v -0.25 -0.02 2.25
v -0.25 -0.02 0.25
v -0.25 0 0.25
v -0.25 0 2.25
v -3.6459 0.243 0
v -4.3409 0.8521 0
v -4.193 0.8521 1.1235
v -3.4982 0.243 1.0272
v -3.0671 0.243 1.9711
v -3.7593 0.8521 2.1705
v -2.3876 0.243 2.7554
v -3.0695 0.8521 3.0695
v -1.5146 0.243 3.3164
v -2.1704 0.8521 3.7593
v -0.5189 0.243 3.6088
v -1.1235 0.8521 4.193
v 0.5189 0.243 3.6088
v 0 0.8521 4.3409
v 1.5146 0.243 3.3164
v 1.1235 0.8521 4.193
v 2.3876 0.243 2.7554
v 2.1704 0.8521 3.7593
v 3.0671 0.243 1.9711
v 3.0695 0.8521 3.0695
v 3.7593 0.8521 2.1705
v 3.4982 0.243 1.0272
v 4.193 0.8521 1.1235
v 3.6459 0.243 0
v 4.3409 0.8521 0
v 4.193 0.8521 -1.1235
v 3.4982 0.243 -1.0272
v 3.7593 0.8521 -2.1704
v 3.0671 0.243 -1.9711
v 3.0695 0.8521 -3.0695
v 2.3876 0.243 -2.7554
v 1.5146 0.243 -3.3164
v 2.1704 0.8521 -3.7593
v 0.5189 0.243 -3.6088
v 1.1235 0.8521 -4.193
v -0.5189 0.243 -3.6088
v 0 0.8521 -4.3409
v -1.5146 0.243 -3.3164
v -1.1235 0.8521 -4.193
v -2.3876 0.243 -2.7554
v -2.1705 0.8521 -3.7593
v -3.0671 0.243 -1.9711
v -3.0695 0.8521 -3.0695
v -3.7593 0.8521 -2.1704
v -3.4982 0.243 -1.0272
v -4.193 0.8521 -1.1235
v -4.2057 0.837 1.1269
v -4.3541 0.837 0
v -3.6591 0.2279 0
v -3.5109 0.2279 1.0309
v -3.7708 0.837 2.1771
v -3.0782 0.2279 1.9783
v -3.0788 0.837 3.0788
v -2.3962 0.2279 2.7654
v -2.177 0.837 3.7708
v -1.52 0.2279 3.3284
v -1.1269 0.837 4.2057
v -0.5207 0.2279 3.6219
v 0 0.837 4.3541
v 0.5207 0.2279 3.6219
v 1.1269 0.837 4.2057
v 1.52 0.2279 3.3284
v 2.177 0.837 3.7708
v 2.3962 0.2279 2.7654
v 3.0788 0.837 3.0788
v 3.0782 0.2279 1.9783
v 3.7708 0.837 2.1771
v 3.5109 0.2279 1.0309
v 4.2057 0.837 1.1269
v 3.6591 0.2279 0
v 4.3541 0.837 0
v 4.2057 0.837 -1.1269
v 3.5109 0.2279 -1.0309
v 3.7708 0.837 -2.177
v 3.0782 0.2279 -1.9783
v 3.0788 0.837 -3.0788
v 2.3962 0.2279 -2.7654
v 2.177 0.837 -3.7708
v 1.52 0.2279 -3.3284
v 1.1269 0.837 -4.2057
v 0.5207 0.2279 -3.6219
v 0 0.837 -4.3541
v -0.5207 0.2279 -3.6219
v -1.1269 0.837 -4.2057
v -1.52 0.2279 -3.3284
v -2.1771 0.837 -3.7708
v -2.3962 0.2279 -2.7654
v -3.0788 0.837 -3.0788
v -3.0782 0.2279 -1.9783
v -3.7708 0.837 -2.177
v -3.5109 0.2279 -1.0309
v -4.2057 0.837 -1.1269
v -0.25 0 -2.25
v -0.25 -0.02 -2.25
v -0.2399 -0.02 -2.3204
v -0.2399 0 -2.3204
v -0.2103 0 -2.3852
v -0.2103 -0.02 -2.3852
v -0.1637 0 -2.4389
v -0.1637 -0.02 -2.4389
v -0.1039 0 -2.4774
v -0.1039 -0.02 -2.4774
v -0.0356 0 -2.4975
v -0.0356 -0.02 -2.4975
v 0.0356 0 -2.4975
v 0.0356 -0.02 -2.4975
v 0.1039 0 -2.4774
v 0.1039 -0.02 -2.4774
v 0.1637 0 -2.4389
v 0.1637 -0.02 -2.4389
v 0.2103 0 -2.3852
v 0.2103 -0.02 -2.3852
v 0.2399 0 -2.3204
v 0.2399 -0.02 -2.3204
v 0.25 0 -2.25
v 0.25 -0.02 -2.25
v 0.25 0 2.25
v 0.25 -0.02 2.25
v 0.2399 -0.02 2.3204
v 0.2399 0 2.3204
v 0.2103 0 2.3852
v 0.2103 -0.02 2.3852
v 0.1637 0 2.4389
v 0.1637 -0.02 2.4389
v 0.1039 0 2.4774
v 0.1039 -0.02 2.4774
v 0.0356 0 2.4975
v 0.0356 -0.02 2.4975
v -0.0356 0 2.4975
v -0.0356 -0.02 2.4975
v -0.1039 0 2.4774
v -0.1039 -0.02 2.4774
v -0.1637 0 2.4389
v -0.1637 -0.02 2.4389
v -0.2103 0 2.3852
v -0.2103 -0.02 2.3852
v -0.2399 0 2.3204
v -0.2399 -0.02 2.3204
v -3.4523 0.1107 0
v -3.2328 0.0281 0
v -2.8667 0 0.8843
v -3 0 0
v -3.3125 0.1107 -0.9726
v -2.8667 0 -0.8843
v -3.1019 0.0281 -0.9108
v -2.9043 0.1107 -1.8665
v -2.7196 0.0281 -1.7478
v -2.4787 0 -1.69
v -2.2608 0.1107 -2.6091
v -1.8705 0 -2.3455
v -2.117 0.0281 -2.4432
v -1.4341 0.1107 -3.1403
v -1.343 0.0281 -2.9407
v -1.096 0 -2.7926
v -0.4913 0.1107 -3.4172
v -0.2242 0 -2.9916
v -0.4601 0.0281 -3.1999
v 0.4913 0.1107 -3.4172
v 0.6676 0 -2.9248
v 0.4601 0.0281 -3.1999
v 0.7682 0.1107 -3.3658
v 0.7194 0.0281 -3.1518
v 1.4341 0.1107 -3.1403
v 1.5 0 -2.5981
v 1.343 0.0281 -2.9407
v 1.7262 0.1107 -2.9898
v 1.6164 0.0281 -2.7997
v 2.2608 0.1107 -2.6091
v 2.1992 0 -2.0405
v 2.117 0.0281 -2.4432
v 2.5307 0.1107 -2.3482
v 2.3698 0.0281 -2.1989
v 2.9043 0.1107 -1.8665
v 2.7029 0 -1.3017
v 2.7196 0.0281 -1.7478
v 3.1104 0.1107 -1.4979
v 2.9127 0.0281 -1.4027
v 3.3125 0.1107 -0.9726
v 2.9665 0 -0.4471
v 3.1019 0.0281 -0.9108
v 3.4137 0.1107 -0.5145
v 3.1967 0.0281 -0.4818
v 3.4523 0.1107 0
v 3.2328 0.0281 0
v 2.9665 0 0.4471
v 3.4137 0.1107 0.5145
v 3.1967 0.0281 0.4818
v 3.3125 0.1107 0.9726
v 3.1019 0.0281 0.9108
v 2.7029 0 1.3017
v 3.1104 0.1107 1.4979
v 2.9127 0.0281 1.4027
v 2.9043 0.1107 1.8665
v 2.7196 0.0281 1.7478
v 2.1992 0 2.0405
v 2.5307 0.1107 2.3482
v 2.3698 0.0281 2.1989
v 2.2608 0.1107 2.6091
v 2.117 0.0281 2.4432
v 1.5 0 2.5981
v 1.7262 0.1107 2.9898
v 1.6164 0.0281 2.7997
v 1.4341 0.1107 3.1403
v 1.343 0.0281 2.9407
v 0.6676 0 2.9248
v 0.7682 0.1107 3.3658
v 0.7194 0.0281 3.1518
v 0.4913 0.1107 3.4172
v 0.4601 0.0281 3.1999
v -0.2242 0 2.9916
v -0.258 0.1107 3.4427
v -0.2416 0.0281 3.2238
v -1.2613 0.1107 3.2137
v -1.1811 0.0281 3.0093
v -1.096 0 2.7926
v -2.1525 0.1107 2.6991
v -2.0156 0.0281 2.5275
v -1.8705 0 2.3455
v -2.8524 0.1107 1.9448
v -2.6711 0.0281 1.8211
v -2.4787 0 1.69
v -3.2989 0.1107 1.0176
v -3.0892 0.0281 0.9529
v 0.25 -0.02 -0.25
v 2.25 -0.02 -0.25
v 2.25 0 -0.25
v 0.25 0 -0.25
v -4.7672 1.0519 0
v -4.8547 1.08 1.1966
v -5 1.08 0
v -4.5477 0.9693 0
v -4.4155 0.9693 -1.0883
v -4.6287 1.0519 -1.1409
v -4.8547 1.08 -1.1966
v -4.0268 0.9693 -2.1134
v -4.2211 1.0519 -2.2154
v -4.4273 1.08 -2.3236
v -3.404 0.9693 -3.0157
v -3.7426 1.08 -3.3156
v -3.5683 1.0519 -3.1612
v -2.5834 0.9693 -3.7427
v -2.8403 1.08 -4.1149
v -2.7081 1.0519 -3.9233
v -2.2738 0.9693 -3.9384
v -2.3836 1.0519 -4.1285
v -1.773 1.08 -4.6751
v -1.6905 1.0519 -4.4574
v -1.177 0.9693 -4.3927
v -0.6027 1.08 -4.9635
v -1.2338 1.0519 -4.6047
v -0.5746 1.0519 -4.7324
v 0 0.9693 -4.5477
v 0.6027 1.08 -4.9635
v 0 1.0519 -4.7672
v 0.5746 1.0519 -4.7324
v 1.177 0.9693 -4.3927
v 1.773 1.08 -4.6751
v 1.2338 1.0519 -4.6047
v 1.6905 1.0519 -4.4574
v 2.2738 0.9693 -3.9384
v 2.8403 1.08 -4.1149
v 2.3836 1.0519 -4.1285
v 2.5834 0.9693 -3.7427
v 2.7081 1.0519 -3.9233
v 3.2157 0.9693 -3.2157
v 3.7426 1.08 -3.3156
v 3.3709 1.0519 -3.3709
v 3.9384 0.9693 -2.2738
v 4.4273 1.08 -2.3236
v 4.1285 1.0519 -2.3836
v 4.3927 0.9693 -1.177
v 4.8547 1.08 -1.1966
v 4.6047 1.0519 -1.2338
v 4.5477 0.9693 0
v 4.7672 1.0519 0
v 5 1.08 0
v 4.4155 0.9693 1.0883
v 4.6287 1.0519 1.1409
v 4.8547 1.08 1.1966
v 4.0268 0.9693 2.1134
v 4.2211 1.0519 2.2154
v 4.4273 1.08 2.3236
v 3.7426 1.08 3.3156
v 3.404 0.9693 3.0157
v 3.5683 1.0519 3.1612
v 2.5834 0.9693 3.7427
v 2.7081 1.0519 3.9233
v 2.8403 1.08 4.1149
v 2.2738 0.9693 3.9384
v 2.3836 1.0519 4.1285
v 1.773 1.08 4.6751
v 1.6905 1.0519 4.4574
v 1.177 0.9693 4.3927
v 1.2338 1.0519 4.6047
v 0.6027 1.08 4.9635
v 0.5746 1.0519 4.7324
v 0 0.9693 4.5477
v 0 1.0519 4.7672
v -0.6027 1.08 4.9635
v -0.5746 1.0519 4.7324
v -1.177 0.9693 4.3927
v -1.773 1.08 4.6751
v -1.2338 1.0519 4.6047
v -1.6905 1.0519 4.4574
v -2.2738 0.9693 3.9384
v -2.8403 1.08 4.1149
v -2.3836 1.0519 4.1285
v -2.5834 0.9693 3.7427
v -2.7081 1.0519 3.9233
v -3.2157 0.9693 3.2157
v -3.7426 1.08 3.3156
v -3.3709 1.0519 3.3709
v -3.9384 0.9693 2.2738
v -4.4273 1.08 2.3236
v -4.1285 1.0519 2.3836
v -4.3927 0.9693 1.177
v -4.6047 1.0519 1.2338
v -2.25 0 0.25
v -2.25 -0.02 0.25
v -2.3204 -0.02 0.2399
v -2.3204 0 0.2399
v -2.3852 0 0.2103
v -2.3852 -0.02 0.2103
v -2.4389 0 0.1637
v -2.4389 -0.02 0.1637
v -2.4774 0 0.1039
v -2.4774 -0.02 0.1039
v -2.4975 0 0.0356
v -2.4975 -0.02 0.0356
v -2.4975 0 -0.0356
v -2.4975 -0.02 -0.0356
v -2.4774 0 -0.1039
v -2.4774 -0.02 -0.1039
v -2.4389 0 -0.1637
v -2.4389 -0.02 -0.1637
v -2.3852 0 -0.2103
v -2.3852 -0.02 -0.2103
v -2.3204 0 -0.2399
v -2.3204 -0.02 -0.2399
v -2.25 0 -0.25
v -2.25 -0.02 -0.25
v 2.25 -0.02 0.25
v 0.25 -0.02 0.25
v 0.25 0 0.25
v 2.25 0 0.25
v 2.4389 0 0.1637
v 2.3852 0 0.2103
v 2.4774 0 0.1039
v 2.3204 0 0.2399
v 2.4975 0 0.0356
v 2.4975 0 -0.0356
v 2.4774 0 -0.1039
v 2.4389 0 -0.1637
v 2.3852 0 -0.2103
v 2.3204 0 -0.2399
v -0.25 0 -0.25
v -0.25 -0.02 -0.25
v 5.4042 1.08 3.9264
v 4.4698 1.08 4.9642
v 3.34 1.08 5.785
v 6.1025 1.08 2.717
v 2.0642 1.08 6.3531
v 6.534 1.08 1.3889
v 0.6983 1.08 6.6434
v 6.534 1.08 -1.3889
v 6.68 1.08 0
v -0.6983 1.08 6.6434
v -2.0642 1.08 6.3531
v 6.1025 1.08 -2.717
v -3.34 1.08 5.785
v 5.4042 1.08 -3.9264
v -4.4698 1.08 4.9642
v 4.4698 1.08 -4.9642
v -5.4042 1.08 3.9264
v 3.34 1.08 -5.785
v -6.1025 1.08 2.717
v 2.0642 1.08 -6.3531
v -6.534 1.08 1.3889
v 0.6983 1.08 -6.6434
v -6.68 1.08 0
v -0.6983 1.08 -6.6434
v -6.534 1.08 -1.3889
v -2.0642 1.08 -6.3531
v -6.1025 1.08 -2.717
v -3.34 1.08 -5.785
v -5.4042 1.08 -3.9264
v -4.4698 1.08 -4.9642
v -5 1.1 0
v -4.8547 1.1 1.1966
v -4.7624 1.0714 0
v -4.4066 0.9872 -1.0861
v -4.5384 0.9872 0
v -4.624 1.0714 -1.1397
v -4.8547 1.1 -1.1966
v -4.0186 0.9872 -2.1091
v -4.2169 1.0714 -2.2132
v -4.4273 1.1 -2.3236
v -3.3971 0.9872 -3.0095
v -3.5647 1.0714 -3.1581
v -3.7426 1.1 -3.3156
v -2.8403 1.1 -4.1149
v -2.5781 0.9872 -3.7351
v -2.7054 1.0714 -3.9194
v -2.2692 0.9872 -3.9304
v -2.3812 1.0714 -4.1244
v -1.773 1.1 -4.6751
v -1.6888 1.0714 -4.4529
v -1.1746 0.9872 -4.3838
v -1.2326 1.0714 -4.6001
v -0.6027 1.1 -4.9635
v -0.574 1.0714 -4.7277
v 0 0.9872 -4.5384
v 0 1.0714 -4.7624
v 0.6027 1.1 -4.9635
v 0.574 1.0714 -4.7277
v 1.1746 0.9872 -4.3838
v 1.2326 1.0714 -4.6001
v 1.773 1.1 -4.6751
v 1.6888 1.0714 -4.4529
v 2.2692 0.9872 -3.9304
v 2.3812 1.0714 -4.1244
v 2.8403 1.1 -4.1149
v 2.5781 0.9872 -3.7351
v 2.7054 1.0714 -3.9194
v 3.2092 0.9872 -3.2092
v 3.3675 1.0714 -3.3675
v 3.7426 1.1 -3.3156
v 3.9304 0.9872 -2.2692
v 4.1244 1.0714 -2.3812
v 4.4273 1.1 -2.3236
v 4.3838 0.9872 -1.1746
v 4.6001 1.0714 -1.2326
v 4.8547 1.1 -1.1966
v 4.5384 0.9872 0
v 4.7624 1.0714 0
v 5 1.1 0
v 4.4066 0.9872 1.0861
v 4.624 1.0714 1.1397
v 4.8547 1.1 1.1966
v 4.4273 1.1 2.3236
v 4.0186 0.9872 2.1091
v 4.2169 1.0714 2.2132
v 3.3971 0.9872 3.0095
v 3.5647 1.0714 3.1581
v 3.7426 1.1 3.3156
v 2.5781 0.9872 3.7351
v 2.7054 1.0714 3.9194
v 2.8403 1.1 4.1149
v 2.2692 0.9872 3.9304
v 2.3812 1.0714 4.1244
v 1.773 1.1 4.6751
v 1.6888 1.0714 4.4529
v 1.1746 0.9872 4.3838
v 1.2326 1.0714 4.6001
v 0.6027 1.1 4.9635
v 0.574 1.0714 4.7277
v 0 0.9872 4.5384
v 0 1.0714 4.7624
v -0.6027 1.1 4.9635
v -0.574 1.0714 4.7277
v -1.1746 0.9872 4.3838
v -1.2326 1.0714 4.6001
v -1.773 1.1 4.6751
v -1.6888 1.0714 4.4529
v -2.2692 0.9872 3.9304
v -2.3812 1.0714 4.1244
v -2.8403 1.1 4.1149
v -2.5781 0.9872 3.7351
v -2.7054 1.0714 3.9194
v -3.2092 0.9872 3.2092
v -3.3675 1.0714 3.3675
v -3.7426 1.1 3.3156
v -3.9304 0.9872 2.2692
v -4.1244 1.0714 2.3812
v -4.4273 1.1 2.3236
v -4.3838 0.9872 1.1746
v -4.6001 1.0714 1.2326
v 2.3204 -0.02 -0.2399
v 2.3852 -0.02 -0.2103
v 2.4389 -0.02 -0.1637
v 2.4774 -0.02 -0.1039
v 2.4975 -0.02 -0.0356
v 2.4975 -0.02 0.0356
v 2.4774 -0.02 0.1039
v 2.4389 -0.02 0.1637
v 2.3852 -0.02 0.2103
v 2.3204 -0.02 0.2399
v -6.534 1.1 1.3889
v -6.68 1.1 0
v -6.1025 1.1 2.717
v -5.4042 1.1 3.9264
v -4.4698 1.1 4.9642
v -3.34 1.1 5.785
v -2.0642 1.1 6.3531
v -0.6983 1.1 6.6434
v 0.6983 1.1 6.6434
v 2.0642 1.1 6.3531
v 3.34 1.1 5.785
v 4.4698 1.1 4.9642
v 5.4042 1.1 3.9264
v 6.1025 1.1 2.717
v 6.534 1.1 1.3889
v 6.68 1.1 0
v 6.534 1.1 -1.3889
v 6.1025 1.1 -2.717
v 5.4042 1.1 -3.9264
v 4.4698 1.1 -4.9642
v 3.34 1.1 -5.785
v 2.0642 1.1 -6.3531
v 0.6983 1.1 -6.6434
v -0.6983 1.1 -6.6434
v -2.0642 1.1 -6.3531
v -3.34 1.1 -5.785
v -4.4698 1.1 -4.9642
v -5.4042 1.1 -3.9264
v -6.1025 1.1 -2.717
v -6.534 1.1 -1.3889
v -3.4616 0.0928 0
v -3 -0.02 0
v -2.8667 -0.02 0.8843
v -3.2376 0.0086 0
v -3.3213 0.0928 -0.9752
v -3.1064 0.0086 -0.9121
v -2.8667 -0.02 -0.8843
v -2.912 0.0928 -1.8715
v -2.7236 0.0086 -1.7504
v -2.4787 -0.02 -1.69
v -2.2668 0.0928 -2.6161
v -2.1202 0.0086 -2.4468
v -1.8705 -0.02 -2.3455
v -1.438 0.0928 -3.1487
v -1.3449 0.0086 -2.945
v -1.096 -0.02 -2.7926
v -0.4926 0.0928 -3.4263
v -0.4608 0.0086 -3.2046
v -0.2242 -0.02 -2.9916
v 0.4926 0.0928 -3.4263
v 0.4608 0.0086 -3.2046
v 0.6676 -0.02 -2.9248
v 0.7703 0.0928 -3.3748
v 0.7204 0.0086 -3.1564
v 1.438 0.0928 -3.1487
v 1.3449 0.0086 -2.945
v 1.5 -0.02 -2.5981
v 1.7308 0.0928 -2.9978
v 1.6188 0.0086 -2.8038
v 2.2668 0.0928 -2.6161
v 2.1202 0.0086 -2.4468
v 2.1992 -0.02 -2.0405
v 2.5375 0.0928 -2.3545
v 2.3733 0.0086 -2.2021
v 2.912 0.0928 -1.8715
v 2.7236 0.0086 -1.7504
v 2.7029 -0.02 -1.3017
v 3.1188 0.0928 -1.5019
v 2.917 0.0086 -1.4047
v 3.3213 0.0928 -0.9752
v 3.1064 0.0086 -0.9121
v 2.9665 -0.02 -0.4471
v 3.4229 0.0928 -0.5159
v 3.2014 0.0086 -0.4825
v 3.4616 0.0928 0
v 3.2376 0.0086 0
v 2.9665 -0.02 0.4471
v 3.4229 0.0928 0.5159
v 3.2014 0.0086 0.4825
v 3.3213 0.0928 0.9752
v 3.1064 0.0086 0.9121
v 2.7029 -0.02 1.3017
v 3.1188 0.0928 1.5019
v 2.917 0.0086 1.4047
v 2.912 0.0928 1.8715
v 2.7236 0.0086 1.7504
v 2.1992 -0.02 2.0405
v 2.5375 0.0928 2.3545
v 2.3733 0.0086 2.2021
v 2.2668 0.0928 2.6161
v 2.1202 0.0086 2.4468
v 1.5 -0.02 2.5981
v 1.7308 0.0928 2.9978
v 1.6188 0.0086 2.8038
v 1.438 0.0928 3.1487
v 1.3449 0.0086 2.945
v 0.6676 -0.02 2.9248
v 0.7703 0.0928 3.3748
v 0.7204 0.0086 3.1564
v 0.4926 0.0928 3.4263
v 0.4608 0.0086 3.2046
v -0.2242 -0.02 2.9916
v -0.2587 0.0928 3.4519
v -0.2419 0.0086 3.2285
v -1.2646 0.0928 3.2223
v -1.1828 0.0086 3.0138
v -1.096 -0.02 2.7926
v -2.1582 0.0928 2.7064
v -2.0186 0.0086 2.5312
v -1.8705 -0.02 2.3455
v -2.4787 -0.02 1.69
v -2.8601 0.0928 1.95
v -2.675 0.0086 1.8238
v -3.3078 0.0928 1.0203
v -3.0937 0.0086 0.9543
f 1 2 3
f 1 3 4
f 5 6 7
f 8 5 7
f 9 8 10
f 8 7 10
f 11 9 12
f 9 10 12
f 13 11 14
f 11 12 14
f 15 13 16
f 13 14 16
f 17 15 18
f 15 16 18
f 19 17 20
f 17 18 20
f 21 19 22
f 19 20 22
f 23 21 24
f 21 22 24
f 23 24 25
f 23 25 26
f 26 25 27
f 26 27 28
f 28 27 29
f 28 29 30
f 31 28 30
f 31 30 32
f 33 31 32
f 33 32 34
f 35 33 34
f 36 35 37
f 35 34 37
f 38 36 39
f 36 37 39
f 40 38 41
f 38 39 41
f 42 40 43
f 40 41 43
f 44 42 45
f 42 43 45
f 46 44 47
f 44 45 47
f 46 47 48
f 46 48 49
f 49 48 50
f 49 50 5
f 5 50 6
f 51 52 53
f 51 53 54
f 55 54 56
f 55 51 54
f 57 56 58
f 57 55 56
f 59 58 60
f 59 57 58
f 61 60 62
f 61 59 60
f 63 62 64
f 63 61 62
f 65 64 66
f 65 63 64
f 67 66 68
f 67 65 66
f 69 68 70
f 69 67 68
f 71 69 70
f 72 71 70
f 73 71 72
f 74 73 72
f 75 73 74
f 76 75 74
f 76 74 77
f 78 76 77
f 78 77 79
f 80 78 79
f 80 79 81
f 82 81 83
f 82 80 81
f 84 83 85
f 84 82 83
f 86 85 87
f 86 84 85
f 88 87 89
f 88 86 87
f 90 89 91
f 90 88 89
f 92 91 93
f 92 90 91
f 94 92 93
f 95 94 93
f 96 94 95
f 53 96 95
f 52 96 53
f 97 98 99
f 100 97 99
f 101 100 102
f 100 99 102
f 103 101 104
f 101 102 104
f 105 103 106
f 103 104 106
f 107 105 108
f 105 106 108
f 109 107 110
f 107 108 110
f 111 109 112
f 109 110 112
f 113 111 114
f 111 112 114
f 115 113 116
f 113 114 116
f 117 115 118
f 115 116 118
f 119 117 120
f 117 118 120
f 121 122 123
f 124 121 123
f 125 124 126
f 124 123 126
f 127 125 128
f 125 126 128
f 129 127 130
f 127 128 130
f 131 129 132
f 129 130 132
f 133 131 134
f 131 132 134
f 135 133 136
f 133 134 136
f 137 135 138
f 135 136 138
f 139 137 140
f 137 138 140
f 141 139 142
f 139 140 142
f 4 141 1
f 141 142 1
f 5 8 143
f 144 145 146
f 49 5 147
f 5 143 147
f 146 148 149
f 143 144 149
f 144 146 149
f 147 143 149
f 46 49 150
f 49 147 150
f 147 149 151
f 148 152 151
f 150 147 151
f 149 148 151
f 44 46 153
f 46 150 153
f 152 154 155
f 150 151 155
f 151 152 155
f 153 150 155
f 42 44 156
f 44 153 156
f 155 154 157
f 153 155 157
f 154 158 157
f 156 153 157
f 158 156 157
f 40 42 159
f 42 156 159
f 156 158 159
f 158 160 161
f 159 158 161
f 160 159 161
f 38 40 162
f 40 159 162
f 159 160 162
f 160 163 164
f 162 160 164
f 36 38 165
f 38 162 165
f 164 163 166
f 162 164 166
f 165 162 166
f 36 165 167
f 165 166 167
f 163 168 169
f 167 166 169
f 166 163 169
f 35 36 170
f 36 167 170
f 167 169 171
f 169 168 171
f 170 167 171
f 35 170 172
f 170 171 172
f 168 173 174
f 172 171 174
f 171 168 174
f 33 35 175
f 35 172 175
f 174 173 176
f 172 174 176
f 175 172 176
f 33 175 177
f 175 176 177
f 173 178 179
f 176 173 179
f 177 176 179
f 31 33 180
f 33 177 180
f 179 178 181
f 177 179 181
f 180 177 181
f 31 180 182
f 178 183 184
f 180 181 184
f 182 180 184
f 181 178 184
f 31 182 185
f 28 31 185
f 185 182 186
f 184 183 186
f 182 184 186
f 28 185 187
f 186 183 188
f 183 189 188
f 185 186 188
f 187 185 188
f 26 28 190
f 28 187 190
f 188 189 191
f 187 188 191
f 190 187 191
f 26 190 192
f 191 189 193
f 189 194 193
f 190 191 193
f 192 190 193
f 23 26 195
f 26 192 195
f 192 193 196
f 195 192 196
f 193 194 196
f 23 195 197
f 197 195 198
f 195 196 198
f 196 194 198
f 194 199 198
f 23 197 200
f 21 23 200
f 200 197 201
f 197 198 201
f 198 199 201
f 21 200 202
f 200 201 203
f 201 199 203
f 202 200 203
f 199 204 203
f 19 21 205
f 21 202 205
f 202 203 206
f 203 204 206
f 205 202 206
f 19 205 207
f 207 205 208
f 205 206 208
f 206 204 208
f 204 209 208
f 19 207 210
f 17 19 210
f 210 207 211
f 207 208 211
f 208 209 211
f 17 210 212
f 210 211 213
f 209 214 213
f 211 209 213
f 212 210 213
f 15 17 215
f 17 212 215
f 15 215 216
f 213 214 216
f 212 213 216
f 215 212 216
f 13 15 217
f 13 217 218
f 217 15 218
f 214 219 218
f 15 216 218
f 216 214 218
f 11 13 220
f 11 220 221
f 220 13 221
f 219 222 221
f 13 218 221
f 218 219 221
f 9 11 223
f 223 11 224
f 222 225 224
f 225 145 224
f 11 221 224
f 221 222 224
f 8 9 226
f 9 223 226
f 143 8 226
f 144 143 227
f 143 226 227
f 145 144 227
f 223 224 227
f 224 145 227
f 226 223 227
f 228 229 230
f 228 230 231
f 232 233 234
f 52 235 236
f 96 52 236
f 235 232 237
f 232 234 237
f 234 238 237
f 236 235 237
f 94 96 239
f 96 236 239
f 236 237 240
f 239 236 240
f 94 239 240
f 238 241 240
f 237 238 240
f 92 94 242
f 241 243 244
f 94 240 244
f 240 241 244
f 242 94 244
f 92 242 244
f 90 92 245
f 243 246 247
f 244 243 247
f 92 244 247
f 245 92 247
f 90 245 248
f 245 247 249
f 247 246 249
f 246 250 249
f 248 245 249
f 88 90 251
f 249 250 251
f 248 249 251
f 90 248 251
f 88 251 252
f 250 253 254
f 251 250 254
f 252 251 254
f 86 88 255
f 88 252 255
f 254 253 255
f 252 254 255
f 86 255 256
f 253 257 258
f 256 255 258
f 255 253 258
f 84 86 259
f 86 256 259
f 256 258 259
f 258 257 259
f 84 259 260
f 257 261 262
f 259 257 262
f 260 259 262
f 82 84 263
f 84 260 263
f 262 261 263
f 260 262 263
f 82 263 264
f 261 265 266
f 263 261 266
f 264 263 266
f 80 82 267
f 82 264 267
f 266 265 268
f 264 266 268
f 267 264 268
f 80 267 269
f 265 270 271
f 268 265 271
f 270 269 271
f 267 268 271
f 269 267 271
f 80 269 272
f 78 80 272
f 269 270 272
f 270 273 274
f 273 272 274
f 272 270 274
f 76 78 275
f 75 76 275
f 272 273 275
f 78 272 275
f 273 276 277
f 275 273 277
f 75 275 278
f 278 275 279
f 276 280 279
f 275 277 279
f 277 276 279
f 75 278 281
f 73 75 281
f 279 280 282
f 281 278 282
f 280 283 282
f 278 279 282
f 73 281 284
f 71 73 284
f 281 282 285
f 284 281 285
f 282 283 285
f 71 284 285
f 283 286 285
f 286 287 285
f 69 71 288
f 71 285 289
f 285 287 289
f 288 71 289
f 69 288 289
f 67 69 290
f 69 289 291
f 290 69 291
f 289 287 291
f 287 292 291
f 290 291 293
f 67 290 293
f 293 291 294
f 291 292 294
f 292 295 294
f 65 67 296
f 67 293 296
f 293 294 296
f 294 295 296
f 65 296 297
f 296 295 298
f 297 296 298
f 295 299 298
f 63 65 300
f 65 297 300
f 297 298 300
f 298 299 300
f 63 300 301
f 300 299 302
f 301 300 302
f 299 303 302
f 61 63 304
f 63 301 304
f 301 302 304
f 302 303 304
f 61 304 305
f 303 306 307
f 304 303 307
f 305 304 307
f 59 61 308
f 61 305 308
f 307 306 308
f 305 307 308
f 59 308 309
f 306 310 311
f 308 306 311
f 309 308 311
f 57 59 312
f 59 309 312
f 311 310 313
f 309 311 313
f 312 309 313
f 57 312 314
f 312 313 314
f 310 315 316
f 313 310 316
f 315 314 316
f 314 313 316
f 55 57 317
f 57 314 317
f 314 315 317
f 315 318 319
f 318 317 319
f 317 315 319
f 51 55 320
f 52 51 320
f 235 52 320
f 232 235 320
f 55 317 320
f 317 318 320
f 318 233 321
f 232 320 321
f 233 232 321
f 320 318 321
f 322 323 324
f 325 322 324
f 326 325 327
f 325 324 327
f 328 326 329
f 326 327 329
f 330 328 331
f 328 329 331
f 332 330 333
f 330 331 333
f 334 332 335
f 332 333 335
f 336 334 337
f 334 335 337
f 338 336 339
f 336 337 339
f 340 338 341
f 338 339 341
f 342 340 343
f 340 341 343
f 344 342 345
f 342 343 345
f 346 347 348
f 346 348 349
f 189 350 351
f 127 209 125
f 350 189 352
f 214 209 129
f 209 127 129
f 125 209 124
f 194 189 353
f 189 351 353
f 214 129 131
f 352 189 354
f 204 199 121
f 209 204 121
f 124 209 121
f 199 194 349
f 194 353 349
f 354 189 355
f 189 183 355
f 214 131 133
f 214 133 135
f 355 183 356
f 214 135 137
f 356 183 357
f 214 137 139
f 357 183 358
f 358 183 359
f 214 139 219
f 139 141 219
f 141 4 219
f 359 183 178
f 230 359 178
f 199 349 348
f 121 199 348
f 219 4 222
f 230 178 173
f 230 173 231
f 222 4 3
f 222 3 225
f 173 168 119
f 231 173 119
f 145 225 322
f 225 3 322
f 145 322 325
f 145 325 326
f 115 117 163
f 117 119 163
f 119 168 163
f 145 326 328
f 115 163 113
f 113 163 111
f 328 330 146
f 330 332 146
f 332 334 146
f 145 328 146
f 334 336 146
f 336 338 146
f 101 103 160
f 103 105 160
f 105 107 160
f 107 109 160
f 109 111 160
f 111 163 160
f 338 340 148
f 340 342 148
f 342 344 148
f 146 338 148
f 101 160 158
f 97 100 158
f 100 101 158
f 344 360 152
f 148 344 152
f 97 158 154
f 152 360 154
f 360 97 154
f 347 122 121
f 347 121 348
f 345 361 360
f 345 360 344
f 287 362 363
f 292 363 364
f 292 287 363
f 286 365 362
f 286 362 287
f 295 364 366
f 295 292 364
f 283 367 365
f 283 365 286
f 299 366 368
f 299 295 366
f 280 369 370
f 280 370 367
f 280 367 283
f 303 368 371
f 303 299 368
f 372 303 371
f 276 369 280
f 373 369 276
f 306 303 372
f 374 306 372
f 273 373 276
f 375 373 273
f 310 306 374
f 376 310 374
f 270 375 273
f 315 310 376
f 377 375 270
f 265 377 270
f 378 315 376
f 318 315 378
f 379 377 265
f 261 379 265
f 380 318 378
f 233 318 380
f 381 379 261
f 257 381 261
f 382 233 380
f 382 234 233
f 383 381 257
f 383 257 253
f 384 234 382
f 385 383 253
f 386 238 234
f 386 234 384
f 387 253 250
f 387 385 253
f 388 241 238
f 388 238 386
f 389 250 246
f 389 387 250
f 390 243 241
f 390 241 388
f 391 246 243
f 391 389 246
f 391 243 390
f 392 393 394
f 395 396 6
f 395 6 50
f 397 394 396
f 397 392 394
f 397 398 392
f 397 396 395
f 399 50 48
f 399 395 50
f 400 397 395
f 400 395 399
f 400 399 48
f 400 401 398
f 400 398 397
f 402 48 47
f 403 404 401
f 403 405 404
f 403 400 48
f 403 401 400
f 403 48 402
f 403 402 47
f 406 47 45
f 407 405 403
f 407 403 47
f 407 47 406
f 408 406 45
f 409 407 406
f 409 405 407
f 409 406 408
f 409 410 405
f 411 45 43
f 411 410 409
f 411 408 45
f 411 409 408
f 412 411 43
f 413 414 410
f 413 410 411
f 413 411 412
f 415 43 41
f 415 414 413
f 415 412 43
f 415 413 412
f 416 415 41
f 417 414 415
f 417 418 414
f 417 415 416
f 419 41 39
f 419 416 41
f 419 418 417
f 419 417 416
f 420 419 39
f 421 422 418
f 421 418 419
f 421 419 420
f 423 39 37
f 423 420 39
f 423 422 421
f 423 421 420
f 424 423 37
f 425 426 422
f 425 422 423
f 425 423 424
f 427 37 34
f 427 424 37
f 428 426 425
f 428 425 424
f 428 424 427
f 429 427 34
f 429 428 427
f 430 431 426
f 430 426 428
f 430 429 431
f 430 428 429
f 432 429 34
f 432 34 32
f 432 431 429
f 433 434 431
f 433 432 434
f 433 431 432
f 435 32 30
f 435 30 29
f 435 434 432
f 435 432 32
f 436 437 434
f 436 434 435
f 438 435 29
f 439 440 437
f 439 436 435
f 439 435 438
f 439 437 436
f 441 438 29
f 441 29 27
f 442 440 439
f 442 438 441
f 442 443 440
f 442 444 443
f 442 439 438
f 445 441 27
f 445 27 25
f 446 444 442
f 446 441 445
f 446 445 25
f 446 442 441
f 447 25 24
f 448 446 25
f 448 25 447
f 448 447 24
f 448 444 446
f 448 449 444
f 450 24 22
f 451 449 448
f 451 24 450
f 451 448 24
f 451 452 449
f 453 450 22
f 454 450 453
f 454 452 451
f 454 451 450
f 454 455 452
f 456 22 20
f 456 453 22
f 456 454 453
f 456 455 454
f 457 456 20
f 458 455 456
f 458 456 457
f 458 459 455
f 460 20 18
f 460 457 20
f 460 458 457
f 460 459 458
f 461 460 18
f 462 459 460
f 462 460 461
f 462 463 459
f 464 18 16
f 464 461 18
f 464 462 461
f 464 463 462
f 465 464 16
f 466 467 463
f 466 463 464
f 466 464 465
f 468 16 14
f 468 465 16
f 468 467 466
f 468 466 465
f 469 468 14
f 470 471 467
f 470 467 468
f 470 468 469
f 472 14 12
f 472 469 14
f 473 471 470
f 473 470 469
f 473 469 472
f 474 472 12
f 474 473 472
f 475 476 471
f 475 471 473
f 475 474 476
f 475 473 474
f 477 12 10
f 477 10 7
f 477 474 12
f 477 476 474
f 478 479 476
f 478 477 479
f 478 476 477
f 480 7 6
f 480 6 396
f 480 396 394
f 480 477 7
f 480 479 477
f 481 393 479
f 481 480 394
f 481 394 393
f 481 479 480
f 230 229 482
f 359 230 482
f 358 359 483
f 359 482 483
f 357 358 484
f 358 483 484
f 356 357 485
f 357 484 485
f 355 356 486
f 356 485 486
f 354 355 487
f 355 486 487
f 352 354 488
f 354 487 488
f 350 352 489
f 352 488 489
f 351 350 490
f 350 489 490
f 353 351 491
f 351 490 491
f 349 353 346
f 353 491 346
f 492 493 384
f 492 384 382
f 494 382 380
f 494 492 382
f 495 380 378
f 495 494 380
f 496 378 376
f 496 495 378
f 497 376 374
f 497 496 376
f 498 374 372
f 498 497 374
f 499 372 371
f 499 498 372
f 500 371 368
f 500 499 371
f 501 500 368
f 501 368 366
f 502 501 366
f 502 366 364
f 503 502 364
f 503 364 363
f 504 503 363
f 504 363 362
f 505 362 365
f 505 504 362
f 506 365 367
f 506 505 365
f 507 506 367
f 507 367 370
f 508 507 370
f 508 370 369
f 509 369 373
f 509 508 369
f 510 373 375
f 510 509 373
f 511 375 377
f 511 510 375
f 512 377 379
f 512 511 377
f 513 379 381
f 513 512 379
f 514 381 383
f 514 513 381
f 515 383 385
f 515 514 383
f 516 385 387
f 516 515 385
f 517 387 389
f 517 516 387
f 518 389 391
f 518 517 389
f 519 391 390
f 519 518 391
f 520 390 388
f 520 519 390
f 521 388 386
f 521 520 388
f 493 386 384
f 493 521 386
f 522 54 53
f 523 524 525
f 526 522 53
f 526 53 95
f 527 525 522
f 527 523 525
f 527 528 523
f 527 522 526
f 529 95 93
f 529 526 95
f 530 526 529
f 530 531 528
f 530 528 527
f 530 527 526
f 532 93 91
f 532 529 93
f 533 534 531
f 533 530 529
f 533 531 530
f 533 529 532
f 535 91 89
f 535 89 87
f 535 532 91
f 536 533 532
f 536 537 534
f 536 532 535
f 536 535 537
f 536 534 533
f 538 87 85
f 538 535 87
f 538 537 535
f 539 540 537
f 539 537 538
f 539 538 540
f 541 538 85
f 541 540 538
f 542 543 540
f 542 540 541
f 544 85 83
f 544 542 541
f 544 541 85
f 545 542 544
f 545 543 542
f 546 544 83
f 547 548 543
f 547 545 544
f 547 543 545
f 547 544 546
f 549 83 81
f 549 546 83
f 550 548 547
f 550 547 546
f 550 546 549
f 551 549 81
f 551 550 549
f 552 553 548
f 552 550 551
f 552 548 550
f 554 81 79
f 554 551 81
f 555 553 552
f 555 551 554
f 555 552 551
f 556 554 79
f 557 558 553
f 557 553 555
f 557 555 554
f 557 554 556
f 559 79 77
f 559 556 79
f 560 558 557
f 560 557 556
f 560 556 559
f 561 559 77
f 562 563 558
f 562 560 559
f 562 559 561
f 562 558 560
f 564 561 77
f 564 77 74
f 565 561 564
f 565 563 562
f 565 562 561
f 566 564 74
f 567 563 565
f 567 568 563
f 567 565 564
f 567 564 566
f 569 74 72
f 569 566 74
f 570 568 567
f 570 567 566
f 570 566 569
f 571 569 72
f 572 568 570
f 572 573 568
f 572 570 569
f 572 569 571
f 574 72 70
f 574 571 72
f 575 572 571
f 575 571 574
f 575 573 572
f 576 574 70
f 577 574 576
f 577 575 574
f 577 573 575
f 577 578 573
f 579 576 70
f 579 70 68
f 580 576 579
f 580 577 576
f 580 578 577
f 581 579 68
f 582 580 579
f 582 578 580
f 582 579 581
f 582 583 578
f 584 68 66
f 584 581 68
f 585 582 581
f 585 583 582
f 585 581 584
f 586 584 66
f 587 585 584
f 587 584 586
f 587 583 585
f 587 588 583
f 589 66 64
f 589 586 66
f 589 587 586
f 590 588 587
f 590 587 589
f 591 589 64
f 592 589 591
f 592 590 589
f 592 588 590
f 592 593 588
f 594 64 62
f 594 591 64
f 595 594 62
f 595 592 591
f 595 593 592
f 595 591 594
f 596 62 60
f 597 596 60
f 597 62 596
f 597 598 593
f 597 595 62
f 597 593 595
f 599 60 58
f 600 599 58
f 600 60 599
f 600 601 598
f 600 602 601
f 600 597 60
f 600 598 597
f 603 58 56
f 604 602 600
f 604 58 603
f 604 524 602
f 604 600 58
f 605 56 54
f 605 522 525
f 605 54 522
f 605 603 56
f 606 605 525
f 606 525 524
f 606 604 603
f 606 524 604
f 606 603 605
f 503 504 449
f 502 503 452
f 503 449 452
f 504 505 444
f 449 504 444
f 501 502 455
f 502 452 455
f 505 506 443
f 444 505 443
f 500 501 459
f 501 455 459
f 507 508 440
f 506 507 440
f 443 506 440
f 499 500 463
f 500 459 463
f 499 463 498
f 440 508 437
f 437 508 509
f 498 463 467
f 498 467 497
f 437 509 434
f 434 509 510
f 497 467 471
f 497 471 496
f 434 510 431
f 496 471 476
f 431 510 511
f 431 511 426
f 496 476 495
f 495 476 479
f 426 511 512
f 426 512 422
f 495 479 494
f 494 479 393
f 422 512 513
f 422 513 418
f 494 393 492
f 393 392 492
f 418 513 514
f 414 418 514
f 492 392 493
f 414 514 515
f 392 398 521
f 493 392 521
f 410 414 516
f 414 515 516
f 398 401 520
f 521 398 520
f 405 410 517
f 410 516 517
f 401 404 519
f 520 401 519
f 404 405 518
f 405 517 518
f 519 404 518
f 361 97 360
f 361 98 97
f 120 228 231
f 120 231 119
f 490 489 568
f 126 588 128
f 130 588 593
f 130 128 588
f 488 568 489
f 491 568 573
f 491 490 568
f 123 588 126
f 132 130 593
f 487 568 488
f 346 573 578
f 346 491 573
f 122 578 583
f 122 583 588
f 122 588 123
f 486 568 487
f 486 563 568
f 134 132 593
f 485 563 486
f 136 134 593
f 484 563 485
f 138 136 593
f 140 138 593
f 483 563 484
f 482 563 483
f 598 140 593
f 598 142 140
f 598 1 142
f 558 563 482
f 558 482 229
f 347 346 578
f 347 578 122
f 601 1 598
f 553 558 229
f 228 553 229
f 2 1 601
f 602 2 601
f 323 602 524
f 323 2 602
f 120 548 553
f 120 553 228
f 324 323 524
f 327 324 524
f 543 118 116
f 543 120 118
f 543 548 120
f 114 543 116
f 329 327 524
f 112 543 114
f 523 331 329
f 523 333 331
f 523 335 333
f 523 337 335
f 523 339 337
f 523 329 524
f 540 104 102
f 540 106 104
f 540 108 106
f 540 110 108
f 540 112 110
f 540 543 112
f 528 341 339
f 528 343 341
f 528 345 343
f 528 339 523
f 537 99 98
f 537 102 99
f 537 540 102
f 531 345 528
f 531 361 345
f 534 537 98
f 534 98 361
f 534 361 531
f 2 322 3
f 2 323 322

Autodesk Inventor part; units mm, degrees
ref_plane "YZ Plane" through (0, 0, 0) normal (1, 0, 0) x (0, 1, 0)
ref_plane "XZ Plane" through (0, 0, 0) normal (0, 1, 0) x (-1, 0, 0)
ref_plane "XY Plane" through (0, 0, 0) normal (0, 0, 1) x (1, 0, 0)
sketch "Skizze1" plane through (0, 0, 0) normal (0, 0, 1) x (1, 0, 0)
  line L0 (0, 0) -> (0, -0.02)
  line L1 (0, -0.02) -> (-3, -0.02)
  arc A0 (-3.6591, 0.2279) -> (-3, -0.02) centre (-3, 0.98) ccw
  line L2 (-3.6591, 0.2279) -> (-4.3541, 0.837)
  arc A1 (-4.3541, 0.837) -> (-5, 1.08) centre (-5, 0.1) ccw
  line L3 (-5, 1.08) -> (-6.68, 1.08)
  line L4 (-6.68, 1.08) -> (-6.68, 1.1)
  line L5 (-6.68, 1.1) -> (-5, 1.1)
  arc A2 (-4.3409, 0.8521) -> (-5, 1.1) centre (-5, 0.1) ccw
  line L6 (-4.3409, 0.8521) -> (-3.6459, 0.243)
  line L7 (-3, 0) -> (0, 0)
  arc A3 (-3.6459, 0.243) -> (-3, 0) centre (-3, 0.98) ccw
  dimension "d0" = 0.02
  dimension "d2" = 10
  dimension "d3" = 0.02
  dimension "d4" = 1
  dimension "d5" = 1.1
  dimension "d6" = 6
revolve "Umdrehung1" add sketch "Skizze1" angle 360 about axis through (0, 0, 0) along (0, -1, 0)
sketch "Skizze2" plane through (0, -0.02, 0) normal (0, -1, 0) x (1, 0, 0)
  line L0 (0, 0) -> (0, 2.5)
  line L1 (0, 2.5) -> (0.25, 2.5)
  line L2 (0.25, 2.5) -> (0.25, 0.25)
  line L3 (0.25, 0.25) -> (2.5, 0.25)
  line L4 (2.5, 0.25) -> (2.5, 0)
  line L5 (2.5, 0) -> (0, 0)
  arc A0 (2.5, 0) -> (2.25, 0.25) centre (2.25, 0) ccw
  arc A1 (0.25, 2.25) -> (0, 2.5) centre (0, 2.25) ccw
  arc A2 (-2.25, 0.25) -> (-2.5, 0) centre (-2.25, 0) ccw
  line L6 (-2.5, 0.25) -> (-0.25, 0.25)
  line L7 (-0.25, 2.5) -> (0, 2.5)
  arc A3 (0, 2.5) -> (-0.25, 2.25) centre (0, 2.25) ccw
  line L8 (-0.25, 0.25) -> (-0.25, 2.5)
  line L9 (-2.5, 0) -> (-2.5, 0.25)
  arc A4 (-0.25, -2.25) -> (0, -2.5) centre (0, -2.25) ccw
  line L10 (-0.25, -2.5) -> (-0.25, -0.25)
  line L11 (-2.5, -0.25) -> (-2.5, 0)
  arc A5 (-2.5, 0) -> (-2.25, -0.25) centre (-2.25, 0) ccw
  line L12 (-0.25, -0.25) -> (-2.5, -0.25)
  line L13 (0, -2.5) -> (-0.25, -2.5)
  arc A6 (2.25, -0.25) -> (2.5, 0) centre (2.25, 0) ccw
  line L14 (2.5, -0.25) -> (0.25, -0.25)
  line L15 (0.25, -2.5) -> (0, -2.5)
  arc A7 (0, -2.5) -> (0.25, -2.25) centre (0, -2.25) ccw
  line L16 (0.25, -0.25) -> (0.25, -2.5)
  line L17 (2.5, 0) -> (2.5, -0.25)
  point P0 (0, 2.5)
  point P1 (-2.5, 0)
  point P2 (0, -2.5)
  point P3 (2.5, 0)
  dimension "d8" = 5
  dimension "d9" = 0.5
  dimension "d12" = 360
extrude "Extrusion1" cut sketch "Skizze2" against normal through all contours L5 A6 L14 L16 A7 A4 L10 L12 A5 A2 L6 L8 A3 L0 | L0 A1 L2 L3 A0 L5
equation "\"d3\" = d0"
equation "\"Biegeradius\" = Stärke"
equation "\"BreiteBiegungsfreistellung\" = Stärke"
equation "\"TiefeBiegungsfreistellung\" = 0.5 * Stärke"
equation "\"GrößeEckenfreistellung\" = 4 * Stärke"
equation "\"MinimalRest\" = 2 * Stärke"
equation "\"Übergangsradius\" = Biegeradius"
equation "\"JacobiRadiusGröße\" = Biegeradius"
equation "\"Abstandsgröße\" = Stärke"
equation "\"Stärke\" = 0.5"
properties part number "bat_contacts_v2_contact_round"
